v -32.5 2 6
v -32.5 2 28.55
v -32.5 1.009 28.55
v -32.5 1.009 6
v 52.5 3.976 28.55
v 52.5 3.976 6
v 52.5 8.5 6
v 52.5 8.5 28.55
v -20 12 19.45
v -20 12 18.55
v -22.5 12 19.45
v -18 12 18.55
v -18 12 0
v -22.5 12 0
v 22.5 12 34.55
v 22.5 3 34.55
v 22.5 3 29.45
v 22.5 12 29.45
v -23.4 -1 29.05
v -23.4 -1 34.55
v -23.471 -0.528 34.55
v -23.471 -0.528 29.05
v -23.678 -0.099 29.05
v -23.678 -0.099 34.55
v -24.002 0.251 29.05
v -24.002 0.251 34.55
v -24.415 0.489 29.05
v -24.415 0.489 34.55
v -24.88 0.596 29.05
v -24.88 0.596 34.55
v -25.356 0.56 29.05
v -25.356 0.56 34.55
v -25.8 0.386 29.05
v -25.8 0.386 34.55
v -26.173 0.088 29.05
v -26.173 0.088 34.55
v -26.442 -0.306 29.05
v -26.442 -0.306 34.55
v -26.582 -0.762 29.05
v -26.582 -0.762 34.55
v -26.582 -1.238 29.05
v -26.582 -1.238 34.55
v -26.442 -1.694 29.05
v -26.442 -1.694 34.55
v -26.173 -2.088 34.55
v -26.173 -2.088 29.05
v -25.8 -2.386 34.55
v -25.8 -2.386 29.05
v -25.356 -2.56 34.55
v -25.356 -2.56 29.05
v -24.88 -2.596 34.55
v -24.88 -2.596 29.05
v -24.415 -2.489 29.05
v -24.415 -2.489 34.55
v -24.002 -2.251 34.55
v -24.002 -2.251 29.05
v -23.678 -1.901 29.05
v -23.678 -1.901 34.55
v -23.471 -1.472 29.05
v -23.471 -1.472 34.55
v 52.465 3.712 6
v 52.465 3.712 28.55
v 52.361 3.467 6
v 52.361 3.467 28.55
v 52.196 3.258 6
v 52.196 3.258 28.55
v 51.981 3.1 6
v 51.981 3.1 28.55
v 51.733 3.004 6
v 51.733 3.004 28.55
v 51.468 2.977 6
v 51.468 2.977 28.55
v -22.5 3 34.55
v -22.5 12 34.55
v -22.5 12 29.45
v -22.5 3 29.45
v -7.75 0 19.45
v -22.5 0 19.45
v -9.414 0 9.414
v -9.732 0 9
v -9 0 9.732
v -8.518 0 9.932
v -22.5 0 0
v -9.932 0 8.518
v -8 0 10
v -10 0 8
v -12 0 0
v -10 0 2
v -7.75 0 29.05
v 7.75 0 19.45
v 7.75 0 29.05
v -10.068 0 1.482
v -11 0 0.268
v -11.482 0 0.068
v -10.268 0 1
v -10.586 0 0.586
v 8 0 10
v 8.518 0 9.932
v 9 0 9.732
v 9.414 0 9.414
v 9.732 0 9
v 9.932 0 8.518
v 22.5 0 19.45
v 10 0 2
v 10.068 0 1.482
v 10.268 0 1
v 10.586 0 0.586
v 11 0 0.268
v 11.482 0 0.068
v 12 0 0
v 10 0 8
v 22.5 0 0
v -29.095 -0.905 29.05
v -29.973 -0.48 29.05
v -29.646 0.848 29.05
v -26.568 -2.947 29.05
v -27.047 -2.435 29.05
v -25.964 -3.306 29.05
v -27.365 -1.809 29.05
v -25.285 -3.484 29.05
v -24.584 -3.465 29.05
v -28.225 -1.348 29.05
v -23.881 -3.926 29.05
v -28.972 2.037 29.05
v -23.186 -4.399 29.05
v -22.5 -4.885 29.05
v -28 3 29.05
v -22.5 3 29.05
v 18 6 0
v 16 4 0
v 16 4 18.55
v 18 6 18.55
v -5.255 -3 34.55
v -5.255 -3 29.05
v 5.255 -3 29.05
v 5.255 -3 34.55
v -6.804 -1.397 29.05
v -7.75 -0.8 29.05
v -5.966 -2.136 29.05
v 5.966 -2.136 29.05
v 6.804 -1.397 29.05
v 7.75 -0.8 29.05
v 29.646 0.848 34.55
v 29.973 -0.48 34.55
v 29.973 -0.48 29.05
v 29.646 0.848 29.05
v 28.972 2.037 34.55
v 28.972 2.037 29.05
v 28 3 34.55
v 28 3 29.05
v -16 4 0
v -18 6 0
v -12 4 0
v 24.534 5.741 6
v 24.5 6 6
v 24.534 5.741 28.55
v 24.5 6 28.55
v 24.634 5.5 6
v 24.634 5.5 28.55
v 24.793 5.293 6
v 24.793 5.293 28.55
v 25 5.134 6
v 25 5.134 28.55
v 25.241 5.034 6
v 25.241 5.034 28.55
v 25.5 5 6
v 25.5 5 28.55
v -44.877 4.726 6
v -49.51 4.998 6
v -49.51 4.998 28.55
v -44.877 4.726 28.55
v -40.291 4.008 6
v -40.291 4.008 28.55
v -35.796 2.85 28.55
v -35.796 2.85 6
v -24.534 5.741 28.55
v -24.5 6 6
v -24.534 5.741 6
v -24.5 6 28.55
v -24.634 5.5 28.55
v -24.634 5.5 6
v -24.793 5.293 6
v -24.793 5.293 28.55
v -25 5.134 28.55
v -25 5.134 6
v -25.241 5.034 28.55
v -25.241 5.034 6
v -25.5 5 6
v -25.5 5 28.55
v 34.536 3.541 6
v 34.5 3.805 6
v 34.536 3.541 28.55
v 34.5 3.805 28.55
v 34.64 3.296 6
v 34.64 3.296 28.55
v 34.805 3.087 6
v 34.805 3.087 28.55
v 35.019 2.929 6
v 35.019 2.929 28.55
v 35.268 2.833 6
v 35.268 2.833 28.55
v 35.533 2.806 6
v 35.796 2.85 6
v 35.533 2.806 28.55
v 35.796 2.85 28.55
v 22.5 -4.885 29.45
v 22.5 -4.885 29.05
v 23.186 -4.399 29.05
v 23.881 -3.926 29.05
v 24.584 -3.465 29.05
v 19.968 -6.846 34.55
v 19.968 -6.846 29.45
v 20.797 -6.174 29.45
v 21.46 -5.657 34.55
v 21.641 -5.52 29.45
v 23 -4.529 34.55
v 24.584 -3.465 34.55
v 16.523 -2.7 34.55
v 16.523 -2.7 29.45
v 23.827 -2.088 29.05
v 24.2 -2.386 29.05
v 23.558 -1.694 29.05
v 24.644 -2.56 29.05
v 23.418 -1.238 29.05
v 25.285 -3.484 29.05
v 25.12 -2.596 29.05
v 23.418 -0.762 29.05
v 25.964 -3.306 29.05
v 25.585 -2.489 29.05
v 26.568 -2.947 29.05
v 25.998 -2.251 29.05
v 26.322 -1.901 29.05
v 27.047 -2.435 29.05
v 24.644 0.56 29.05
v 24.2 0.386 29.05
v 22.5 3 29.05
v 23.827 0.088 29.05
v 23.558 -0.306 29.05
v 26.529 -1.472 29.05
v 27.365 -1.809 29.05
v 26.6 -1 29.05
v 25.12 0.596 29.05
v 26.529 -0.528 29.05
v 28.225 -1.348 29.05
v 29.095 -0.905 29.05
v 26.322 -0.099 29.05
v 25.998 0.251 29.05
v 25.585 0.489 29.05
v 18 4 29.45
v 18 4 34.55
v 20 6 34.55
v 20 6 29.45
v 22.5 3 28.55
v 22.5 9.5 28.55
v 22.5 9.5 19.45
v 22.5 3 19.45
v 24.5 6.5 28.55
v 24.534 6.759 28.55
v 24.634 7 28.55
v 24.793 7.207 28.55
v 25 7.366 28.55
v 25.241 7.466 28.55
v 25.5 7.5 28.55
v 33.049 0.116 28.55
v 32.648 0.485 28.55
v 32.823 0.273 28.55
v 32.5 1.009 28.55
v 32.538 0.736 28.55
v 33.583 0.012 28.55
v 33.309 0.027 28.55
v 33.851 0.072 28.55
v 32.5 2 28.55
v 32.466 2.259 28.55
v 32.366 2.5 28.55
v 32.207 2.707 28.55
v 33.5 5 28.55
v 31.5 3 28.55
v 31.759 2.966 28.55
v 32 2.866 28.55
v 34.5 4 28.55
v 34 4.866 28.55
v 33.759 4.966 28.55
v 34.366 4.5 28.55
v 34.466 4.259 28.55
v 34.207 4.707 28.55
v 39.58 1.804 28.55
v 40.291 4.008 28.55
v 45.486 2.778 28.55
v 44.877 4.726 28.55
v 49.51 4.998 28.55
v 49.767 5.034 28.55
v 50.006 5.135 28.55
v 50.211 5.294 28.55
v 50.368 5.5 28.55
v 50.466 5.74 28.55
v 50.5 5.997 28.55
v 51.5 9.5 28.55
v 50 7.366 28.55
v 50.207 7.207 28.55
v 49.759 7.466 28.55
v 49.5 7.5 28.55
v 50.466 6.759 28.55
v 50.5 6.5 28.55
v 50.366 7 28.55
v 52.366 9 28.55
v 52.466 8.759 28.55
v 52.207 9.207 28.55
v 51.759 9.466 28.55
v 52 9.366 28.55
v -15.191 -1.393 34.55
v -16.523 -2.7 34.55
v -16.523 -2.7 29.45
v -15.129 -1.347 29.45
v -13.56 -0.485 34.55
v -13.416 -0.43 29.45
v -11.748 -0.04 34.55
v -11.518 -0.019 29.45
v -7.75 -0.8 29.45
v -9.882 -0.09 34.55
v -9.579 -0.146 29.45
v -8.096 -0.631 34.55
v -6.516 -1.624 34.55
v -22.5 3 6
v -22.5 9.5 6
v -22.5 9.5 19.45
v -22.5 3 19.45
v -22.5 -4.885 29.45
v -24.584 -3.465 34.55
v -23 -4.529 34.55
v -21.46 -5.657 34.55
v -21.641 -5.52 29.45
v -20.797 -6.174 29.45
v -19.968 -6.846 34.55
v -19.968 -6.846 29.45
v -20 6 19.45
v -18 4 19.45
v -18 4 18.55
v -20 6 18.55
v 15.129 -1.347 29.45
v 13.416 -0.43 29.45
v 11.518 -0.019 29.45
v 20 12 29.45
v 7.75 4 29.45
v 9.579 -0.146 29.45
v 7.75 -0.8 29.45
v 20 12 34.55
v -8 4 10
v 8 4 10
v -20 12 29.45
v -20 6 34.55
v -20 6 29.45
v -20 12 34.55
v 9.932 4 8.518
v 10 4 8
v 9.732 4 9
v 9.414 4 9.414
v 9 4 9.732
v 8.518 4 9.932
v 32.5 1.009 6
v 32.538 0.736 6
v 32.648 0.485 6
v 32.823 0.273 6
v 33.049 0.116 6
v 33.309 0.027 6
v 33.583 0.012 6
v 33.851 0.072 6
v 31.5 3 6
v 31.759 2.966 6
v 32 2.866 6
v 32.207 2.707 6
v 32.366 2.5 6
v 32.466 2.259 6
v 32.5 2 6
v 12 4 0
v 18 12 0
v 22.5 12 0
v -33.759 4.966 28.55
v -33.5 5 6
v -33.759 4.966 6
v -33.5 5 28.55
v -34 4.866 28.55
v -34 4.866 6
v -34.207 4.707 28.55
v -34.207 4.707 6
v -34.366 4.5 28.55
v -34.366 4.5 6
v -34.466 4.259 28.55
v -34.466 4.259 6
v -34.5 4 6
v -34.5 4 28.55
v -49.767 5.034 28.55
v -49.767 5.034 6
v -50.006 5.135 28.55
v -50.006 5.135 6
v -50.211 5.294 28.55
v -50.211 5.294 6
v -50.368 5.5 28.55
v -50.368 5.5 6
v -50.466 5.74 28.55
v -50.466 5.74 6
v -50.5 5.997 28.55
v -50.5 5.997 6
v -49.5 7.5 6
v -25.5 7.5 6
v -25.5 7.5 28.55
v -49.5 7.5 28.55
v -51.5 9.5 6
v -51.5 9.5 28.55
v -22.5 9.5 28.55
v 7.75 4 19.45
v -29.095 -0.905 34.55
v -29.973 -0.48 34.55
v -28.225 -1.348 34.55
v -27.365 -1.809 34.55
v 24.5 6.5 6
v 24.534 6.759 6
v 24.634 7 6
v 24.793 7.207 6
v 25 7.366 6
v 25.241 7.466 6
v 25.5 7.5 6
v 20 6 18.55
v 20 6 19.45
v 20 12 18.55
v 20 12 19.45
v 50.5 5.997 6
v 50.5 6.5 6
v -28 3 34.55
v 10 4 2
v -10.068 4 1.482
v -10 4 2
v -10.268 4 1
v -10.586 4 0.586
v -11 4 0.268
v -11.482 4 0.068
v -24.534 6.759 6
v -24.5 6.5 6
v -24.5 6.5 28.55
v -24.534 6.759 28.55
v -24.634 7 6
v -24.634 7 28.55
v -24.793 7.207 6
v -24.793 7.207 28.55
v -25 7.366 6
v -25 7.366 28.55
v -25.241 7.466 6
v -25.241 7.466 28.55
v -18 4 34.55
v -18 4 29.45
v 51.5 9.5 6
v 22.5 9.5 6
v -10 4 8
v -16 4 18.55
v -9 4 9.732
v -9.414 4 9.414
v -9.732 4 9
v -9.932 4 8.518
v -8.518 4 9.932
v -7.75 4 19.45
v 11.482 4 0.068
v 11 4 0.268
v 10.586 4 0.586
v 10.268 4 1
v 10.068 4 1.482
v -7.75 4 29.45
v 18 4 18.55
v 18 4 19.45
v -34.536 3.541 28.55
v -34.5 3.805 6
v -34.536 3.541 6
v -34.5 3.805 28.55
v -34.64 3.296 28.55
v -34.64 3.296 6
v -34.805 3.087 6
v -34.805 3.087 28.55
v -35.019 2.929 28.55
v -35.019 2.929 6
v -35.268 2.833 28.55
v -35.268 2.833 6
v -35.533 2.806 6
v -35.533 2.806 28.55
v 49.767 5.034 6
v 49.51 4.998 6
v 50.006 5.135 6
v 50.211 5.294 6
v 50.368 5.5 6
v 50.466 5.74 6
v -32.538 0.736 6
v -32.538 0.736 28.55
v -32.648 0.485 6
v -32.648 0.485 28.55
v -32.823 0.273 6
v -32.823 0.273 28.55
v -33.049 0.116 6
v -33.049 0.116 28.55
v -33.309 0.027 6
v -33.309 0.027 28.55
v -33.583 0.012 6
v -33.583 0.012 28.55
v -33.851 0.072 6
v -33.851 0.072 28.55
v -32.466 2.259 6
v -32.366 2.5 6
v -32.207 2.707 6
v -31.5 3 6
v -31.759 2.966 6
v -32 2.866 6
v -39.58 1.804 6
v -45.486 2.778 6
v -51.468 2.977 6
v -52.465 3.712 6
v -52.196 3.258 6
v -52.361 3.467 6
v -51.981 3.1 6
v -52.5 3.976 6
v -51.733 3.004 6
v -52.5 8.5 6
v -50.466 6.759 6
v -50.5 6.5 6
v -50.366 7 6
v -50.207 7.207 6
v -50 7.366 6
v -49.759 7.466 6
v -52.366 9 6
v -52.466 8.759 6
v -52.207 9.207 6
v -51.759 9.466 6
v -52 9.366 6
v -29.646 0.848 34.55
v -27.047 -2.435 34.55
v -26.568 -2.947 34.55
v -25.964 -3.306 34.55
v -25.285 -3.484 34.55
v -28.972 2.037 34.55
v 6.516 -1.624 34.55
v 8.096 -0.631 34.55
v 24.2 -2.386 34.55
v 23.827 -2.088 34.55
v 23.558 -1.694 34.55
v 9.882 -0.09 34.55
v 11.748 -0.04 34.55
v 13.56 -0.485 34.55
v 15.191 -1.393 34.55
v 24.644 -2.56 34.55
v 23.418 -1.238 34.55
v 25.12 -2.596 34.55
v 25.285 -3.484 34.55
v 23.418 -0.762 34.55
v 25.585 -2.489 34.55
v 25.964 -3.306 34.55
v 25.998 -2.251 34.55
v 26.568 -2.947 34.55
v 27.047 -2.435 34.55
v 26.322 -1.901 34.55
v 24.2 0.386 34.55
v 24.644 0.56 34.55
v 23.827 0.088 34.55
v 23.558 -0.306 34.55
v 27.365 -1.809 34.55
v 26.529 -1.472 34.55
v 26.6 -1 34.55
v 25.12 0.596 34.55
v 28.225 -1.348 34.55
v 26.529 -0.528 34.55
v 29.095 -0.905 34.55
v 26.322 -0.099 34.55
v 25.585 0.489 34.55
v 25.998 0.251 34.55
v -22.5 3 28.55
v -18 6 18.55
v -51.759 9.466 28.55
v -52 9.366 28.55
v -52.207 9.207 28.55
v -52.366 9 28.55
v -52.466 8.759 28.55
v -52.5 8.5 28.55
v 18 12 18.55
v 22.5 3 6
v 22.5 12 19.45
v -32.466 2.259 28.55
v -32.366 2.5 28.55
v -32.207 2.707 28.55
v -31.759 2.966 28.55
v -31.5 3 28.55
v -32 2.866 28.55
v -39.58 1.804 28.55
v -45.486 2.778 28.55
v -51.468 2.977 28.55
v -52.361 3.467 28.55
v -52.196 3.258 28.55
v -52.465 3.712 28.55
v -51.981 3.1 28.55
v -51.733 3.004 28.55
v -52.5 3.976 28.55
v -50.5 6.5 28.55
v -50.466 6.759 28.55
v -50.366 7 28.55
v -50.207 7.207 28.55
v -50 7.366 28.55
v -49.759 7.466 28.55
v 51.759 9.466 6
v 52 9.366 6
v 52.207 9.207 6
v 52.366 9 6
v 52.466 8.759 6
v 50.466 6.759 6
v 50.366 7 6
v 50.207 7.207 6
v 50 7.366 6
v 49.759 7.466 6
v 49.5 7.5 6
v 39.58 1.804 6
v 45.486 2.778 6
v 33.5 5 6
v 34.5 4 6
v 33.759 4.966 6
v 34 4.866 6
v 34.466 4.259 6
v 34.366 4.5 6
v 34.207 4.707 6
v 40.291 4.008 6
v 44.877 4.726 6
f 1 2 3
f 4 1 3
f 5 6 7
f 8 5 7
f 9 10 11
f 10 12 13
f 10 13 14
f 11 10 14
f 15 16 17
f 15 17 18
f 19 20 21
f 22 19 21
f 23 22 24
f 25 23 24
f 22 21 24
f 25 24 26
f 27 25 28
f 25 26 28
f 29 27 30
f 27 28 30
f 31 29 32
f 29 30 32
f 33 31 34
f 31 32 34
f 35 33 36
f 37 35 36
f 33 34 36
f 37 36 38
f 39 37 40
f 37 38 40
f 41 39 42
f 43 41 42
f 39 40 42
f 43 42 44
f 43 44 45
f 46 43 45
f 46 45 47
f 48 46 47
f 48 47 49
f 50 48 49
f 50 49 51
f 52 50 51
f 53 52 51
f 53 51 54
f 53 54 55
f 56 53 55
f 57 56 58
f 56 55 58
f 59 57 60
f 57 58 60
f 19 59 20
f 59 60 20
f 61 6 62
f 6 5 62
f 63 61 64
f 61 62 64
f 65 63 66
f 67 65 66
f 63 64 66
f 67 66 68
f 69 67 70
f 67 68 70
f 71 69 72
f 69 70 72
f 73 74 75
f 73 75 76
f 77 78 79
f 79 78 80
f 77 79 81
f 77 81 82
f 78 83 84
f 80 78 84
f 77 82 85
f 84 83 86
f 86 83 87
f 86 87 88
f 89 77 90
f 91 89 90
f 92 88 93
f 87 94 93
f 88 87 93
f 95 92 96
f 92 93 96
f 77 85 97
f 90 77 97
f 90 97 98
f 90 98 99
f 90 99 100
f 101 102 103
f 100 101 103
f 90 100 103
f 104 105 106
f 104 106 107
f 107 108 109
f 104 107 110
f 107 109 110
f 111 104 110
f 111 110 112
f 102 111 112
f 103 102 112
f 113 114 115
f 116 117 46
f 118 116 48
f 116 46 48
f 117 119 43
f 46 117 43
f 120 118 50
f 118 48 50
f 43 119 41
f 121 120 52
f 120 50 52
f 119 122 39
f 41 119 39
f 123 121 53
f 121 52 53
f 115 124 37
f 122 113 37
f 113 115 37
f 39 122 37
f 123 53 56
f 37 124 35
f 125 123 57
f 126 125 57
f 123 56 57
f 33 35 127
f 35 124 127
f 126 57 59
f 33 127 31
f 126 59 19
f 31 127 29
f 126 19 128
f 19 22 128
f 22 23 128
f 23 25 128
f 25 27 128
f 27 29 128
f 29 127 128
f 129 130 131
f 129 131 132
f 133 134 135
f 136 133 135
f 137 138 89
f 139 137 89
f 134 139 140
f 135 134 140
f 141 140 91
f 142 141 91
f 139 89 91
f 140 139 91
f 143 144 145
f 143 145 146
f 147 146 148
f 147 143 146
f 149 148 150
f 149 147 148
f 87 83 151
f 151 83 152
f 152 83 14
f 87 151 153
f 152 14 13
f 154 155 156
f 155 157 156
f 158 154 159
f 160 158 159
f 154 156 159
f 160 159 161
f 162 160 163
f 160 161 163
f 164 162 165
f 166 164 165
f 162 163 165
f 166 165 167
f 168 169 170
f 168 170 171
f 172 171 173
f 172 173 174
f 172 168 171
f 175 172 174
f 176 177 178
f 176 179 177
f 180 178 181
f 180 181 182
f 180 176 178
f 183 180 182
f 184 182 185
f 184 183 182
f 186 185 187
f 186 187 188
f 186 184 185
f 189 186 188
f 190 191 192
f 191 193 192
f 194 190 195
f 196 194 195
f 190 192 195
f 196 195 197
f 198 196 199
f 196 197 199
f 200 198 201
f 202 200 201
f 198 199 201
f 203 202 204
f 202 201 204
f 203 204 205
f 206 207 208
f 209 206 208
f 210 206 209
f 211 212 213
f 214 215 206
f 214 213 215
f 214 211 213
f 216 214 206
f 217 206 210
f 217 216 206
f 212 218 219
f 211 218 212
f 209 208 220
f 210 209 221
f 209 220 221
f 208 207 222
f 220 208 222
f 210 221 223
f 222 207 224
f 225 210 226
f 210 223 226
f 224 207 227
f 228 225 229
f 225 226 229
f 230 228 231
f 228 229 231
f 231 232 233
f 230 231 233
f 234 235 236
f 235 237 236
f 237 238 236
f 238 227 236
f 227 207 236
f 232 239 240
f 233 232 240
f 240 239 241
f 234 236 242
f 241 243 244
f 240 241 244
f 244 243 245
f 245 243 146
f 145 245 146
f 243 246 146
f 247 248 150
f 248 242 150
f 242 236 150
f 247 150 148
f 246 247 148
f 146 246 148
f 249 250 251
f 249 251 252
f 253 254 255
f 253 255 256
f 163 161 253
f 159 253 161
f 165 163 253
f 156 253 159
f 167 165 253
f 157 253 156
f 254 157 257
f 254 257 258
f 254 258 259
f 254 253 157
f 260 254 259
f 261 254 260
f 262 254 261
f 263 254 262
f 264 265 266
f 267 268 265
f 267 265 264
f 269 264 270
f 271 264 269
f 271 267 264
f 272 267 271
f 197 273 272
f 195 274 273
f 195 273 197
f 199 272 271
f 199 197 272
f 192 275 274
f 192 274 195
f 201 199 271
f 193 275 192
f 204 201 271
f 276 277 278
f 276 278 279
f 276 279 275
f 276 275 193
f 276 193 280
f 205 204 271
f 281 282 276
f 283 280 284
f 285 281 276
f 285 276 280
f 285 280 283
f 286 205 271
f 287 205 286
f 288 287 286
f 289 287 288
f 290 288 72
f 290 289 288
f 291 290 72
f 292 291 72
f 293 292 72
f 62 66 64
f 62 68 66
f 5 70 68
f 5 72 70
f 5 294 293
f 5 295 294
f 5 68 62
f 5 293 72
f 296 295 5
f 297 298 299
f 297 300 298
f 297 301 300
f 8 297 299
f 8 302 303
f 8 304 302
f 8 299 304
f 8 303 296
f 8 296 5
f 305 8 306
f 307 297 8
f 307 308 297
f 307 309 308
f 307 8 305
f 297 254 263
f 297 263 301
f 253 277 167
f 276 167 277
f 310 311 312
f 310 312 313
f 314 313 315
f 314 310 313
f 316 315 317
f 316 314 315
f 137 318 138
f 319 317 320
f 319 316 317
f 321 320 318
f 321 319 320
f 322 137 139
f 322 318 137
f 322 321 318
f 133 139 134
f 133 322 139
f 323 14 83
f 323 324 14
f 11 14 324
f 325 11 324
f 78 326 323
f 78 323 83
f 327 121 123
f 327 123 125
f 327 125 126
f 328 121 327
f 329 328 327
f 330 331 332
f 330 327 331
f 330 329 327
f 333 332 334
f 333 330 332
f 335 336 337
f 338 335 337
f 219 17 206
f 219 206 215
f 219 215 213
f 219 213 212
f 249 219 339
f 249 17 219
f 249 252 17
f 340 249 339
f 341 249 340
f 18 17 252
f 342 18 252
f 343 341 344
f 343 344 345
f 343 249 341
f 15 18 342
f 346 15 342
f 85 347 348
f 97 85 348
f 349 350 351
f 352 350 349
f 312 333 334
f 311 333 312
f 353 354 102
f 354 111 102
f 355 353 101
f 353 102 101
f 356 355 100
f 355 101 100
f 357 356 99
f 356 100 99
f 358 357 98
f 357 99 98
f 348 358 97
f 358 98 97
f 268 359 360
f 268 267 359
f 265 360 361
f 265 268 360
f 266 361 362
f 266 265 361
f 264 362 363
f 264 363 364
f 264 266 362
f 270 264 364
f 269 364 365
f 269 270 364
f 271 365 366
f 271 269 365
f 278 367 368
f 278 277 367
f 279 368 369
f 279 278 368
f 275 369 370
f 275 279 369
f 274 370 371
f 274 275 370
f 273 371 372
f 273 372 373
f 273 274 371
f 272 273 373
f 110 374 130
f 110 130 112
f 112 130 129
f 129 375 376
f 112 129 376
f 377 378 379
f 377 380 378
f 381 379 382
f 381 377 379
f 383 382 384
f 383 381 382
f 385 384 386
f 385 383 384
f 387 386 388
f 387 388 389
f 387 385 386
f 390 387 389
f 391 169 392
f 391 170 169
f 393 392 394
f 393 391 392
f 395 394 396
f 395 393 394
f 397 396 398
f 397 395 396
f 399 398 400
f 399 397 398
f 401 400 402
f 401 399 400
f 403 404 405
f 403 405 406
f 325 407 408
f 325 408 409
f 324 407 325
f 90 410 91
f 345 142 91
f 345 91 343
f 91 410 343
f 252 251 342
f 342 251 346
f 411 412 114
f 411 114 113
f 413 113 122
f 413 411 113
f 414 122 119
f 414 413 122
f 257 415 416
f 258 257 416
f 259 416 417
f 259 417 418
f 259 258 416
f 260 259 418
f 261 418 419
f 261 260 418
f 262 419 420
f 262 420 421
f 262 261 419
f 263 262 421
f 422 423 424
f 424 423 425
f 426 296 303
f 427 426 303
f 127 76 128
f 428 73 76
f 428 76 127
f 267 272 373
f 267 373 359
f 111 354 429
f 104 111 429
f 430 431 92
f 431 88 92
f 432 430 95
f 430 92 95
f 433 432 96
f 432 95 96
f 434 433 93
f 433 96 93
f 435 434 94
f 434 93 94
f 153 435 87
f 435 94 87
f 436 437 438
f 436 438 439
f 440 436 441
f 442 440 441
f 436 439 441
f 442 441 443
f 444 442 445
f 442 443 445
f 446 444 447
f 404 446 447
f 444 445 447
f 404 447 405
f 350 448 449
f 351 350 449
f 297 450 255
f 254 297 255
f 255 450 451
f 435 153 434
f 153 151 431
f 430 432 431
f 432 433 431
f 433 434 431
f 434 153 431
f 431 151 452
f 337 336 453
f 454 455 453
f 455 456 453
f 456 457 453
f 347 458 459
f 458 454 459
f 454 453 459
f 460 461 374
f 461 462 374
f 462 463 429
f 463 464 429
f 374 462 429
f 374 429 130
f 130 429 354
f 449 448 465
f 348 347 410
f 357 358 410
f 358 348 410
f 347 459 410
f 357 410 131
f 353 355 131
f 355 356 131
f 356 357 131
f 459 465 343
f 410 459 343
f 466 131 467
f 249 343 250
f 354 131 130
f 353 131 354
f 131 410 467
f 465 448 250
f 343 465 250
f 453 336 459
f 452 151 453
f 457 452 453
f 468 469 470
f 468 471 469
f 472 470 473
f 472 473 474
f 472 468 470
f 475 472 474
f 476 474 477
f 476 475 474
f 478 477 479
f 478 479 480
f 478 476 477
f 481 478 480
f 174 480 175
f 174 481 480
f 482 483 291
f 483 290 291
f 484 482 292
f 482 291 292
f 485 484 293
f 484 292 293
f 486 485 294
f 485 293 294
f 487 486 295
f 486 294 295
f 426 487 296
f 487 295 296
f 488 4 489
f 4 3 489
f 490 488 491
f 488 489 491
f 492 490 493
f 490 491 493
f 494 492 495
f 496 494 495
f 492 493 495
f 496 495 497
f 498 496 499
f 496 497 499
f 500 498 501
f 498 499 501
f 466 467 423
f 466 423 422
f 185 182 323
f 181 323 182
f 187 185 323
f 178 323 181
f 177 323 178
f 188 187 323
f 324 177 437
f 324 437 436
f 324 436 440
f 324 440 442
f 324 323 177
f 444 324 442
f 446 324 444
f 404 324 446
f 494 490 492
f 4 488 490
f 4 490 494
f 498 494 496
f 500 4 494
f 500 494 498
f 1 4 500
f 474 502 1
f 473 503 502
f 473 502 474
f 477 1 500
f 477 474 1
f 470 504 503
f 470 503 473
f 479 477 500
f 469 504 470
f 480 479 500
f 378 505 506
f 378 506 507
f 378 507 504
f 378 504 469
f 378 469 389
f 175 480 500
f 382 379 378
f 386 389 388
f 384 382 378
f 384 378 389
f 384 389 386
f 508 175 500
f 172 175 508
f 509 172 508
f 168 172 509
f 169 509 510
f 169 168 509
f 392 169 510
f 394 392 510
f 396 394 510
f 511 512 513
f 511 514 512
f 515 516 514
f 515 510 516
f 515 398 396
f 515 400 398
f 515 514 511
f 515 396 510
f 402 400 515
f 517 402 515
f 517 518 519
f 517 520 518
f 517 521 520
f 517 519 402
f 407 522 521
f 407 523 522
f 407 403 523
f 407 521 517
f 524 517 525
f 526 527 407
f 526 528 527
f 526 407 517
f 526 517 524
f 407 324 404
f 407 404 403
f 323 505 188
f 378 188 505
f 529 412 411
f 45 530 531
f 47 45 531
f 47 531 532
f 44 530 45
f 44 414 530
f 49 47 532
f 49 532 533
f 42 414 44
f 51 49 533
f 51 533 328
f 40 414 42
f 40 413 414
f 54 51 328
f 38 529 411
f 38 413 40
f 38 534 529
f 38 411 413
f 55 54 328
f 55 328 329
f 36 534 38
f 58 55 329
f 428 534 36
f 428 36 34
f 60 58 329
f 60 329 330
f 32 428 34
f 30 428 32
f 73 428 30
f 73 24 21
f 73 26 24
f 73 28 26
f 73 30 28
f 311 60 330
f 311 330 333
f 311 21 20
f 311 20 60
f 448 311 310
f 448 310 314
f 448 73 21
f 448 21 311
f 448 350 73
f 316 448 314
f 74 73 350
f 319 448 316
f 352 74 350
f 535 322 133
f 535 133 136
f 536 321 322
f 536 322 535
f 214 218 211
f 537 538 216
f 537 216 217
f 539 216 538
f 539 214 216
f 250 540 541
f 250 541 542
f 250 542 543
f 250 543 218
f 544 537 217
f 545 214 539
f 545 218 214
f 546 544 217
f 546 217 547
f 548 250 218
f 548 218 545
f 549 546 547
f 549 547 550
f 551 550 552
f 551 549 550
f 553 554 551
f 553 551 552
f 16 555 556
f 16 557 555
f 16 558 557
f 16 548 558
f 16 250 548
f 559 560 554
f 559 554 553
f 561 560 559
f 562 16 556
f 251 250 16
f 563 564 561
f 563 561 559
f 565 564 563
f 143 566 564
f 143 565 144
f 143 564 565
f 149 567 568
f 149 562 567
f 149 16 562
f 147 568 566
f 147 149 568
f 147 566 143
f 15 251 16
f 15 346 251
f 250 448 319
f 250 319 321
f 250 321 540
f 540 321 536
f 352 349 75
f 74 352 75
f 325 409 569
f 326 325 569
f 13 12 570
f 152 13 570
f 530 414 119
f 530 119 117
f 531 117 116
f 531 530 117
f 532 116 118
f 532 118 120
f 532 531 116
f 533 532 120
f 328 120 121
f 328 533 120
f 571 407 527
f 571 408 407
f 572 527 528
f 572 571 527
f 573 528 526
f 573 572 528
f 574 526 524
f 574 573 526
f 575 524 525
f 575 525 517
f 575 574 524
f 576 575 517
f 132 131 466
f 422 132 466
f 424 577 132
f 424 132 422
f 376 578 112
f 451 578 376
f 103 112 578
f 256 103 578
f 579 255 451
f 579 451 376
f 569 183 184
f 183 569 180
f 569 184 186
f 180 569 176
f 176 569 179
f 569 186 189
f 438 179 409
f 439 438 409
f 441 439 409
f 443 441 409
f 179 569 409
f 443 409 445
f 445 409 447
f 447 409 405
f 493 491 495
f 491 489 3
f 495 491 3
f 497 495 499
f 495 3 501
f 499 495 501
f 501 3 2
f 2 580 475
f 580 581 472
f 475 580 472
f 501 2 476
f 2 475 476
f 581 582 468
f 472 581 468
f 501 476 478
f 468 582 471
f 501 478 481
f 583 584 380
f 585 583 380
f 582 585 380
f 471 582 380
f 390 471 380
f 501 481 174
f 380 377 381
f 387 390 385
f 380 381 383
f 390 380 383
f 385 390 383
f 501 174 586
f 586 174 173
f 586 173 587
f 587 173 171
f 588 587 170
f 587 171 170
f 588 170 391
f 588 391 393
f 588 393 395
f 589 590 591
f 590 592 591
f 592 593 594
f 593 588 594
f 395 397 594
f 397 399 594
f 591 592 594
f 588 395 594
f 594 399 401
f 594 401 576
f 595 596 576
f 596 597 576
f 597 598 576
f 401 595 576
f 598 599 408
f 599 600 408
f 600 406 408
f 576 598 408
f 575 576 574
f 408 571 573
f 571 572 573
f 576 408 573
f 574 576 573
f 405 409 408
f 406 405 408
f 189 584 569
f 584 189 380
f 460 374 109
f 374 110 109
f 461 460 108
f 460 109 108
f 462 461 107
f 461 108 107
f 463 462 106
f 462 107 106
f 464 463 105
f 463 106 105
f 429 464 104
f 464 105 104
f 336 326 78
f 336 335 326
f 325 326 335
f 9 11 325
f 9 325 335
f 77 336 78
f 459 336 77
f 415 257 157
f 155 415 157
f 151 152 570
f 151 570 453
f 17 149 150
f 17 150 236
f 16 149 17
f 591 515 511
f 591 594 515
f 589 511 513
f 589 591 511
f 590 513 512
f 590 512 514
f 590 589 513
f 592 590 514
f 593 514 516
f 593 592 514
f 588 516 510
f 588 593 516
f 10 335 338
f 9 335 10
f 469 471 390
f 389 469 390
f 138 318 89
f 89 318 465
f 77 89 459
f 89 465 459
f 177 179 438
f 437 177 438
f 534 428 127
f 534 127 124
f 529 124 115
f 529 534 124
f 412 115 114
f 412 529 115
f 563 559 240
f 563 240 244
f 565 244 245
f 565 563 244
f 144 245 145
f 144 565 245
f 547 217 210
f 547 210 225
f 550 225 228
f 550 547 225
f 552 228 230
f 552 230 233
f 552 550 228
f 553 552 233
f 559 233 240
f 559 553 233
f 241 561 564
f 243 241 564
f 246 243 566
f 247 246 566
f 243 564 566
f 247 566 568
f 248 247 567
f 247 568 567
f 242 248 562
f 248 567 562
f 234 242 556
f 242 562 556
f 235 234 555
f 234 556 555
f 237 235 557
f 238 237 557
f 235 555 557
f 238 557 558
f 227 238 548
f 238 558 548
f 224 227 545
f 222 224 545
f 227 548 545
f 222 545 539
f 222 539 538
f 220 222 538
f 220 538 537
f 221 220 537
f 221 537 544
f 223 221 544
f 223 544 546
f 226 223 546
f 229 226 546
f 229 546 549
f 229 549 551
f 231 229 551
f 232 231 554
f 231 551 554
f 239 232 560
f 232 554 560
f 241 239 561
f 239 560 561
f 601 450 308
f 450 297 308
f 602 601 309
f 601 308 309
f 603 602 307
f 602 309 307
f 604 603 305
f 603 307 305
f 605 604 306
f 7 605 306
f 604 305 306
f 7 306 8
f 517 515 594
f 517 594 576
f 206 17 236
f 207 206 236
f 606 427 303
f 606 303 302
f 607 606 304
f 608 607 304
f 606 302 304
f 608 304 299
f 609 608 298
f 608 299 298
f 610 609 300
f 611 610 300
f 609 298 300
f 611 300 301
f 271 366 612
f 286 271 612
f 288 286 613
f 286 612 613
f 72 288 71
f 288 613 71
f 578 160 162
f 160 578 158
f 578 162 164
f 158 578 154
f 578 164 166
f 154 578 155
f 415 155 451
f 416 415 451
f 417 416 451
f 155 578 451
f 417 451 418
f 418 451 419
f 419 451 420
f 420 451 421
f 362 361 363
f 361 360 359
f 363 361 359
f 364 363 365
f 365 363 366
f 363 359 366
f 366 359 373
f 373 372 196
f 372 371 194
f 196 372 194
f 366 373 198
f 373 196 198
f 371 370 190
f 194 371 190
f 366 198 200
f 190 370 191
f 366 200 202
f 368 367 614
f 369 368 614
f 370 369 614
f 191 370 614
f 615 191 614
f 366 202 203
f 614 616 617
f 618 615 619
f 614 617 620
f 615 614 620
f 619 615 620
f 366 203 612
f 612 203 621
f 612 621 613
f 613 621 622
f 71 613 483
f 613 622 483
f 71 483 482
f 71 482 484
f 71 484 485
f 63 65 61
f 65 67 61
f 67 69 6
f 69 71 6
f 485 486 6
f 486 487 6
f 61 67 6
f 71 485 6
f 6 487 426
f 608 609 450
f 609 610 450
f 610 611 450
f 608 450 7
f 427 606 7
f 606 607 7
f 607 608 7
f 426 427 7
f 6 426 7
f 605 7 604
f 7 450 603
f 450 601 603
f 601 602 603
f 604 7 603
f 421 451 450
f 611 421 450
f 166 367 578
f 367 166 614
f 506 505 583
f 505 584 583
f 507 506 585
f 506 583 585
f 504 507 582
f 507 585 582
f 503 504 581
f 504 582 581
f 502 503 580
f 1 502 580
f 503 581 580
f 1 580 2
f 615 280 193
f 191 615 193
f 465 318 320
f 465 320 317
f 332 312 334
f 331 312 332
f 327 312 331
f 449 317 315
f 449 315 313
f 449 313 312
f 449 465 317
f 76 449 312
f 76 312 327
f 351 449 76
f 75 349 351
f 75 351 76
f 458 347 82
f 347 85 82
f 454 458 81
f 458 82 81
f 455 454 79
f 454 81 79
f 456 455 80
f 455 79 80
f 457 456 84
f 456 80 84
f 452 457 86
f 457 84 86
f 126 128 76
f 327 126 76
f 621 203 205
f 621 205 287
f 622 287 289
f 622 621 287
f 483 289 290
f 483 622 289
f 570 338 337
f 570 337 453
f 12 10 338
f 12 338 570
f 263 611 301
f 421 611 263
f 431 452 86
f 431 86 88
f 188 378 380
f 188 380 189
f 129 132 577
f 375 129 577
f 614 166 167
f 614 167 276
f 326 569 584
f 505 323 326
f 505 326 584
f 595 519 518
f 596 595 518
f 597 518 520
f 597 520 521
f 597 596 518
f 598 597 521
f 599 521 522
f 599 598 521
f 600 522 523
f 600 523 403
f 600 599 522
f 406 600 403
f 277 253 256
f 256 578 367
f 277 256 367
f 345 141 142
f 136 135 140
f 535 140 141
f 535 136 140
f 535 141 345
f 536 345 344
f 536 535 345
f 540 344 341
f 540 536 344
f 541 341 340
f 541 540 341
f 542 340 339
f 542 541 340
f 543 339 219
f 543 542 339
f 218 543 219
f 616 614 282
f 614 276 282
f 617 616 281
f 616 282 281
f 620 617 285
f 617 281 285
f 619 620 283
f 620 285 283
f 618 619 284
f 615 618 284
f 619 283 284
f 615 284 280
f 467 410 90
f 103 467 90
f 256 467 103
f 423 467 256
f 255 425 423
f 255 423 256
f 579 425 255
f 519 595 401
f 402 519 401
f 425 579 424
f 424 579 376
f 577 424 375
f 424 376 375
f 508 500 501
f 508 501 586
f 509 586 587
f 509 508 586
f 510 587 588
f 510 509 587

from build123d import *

# Parameters (mm, degrees)
EXTRUDE_1_DEPTH          = 34.55
SKETCH_2_W               = 40
SKETCH_2_H               = 8
CUT_EXTRUDE_1_DEPTH      = 16
CHAMFER_1_SIZE           = 2
SKETCH_6_R               = 1.6
EXTRUDE_2_DEPTH          = 6.9
SKETCH_8_R               = 1.6
EXTRUDE_3_DEPTH          = 5.5
CUT_EXTRUDE_6_DEPTH      = 10
CUT_EXTRUDE_7_DEPTH      = 25
CUT_EXTRUDE_8_DEPTH      = 25
CUT_EXTRUDE_8_DEPTH_BACK = 25
SKETCH_14_W              = 20
SKETCH_14_H              = 10
CUT_EXTRUDE_9_DEPTH      = 25
FILLET_1_R               = 2
EXTRUDE_START            = -6
EXTRUDE_4_DEPTH          = 22.55
FILLET_2_R               = 1


with BuildPart() as part:
    # 草图1 → 凸台-拉伸1 (new body)
    with BuildSketch(Plane.XY):
        Polygon((0, 0), (22.5, 0), (22.5, 12), (-22.5, 12), (-22.5, 0), align=None)
    extrude(amount=EXTRUDE_1_DEPTH)

    # 草图2 → 切除-拉伸1 (cut)
    with BuildSketch(Plane.XY.offset(34.55)):
        with Locations((0, 8)):
            Rectangle(SKETCH_2_W, SKETCH_2_H)
    extrude(amount=-CUT_EXTRUDE_1_DEPTH, mode=Mode.SUBTRACT)

    # 倒角1
    chamfer_1_edges = [part.edges().sort_by_distance(p)[0] for p in [
        (20, 4, 26.55),
        (-20, 4, 26.55),
    ]]
    chamfer(chamfer_1_edges, length=CHAMFER_1_SIZE)

    # 草图6 → 凸台-拉伸2 (add)
    with BuildSketch(Plane(origin=(0, 12, 0), x_dir=(1, 0, 0), z_dir=(0, 1, 0))):
        with BuildLine():
            Line((22.5, 0), (22.5, -13.5))
            Line((22.5, -13.5), (17, -13.5))
            ThreePointArc((17, -13.5), (15.232233047, -12.767766953), (14.5, -11))
            Line((14.5, -11), (14.5, -5))
            Line((14.5, -5), (14.5, 0))
            Line((14.5, 0), (22.5, 0))
        make_face()
        with Locations((17, -5)):
            Circle(SKETCH_6_R, mode=Mode.SUBTRACT)
        with Locations((17, -11)):
            Circle(SKETCH_6_R, mode=Mode.SUBTRACT)
        with BuildLine():
            Line((-14.5, 0), (-22.5, 0))
            Line((-22.5, 0), (-22.5, -13.5))
            Line((-22.5, -13.5), (-17, -13.5))
            ThreePointArc((-17, -13.5), (-15.232233047, -12.767766953), (-14.5, -11))
            Line((-14.5, -11), (-14.5, -5))
            Line((-14.5, -5), (-14.5, 0))
        make_face()
        with Locations((-17, -11)):
            Circle(SKETCH_6_R, mode=Mode.SUBTRACT)
        with Locations((-17, -5)):
            Circle(SKETCH_6_R, mode=Mode.SUBTRACT)
    extrude(amount=-EXTRUDE_2_DEPTH)

    # 草图8 → 凸台-拉伸3 (add)
    with BuildSketch(Plane.XY.offset(34.55)):
        with BuildLine():
            Line((1.843049286, -25.367101461), (9.230566594, -19.615105309))
            ThreePointArc((9.230566594, -19.615105309), (9.814108465, -18.625953935), (10.421644381, -17.651355727))
            Line((10.421644381, -17.651355727), (5.476763257, -11.300448334))
            ThreePointArc((5.476763257, -11.300448334), (6.699551666, -1.476763257), (16.523236743, -2.699551666))
            Line((16.523236743, -2.699551666), (19.967990067, -6.846461039))
            ThreePointArc((19.967990067, -6.846461039), (22.224318463, -5.085470923), (24.58365332, -3.465087309))
            ThreePointArc((24.58365332, -3.465087309), (26.278709649, -3.148232211), (27.365383934, -1.809295278))
            ThreePointArc((27.365383934, -1.809295278), (28.658809968, -1.124546474), (29.972928279, -0.480399834))
            ThreePointArc((29.972928279, -0.480399834), (29.349734714, 1.46572665), (28, 3))
            Line((28, 3), (22.5, 3))
            Line((22.5, 3), (22.5, 4))
            Line((22.5, 4), (-22.5, 4))
            Line((-22.5, 4), (-22.5, 3))
            Line((-22.5, 3), (-28, 3))
            ThreePointArc((-28, 3), (-29.349734714, 1.46572665), (-29.972928279, -0.480399834))
            ThreePointArc((-29.972928279, -0.480399834), (-28.658809968, -1.124546474), (-27.365383934, -1.809295278))
            ThreePointArc((-27.365383934, -1.809295278), (-26.278709649, -3.148232211), (-24.58365332, -3.465087309))
            ThreePointArc((-24.58365332, -3.465087309), (-22.224318463, -5.085470923), (-19.967990067, -6.846461039))
            Line((-19.967990067, -6.846461039), (-16.523236743, -2.699551666))
            ThreePointArc((-16.523236743, -2.699551666), (-6.699551666, -1.476763257), (-5.476763257, -11.300448334))
            Line((-5.476763257, -11.300448334), (-10.421644381, -17.651355727))
            ThreePointArc((-10.421644381, -17.651355727), (-9.814108465, -18.625953935), (-9.230566594, -19.615105309))
            Line((-9.230566594, -19.615105309), (-1.843049286, -25.367101461))
            ThreePointArc((-1.843049286, -25.367101461), (0, -26), (1.843049286, -25.367101461))
        make_face()
        with Locations((25, -1)):
            Circle(SKETCH_8_R, mode=Mode.SUBTRACT)
        with Locations((0, -23)):
            Circle(SKETCH_8_R, mode=Mode.SUBTRACT)
        with Locations((-25, -1)):
            Circle(SKETCH_8_R, mode=Mode.SUBTRACT)
    extrude(amount=-EXTRUDE_3_DEPTH)

    # 草图11 → 切除-拉伸6 (cut)
    with BuildSketch(Plane(origin=(0, 0, 29.05), x_dir=(-1, 0, 0), z_dir=(0, 0, -1))):
        Polygon((-4, -7), (-10.421644381, -17.651355727), (-10.421644381, -27.0891889), (10.421644381, -27.0891889), (10.421644381, -17.651355727), (4, -7), (5.255437353, -3), (0, -3), (-5.255437353, -3), align=None)
    extrude(amount=-CUT_EXTRUDE_6_DEPTH, mode=Mode.SUBTRACT)

    # 草图12 → 切除-拉伸7 (cut)
    with BuildSketch(Plane.XY.offset(18.55)):
        Polygon((-18, 6), (-16, 4), (16, 4), (18, 6), (18, 12), (-18, 12), align=None)
    extrude(amount=-CUT_EXTRUDE_7_DEPTH, mode=Mode.SUBTRACT)

    # 草图13 → 切除-拉伸8 (cut, two sides)
    with BuildSketch(Plane(origin=(0, 4, 0), x_dir=(1, 0, 0), z_dir=(0, 1, 0))) as cut_extrude_8_sk:
        Polygon((-7.75, -24.45), (-7.75, -28.45), (-7.75, -29.45), (-22.5, -29.45), (-22.5, -28.45), (-22.5, -24.45), (-22.5, -21.45), (-22.5, -19.45), (-7.75, -19.45), align=None)
        Polygon((22.5, -19.45), (22.5, -21.45), (22.5, -24.45), (22.5, -28.45), (22.5, -29.45), (7.75, -29.45), (7.75, -28.45), (7.75, -24.45), (7.75, -19.45), align=None)
    extrude(amount=CUT_EXTRUDE_8_DEPTH, mode=Mode.SUBTRACT)
    extrude(cut_extrude_8_sk.sketch, amount=-CUT_EXTRUDE_8_DEPTH_BACK, mode=Mode.SUBTRACT)

    # 草图14 → 切除-拉伸9 (cut)
    with BuildSketch(Plane(origin=(0, 4, 0), x_dir=(1, 0, 0), z_dir=(0, 1, 0))):
        with Locations((0, -5)):
            Rectangle(SKETCH_14_W, SKETCH_14_H)
    extrude(amount=-CUT_EXTRUDE_9_DEPTH, mode=Mode.SUBTRACT)

    # 圆角1
    fillet_1_edges = [part.edges().sort_by_distance(p)[0] for p in [
        (10, 2, 0),
        (-10, 2, 0),
        (10, 2, 10),
        (-10, 2, 10),
    ]]
    fillet(fillet_1_edges, radius=FILLET_1_R)

    # 草图15 → 凸台-拉伸4 (add)
    with BuildSketch(Plane(origin=(0, 0, 0), x_dir=(-1, 0, 0), z_dir=(0, 0, -1)).offset(EXTRUDE_START)):
        with BuildLine():
            Line((-22.5, 9.5), (-22.5, 3))
            Line((-22.5, 3), (-32.5, 3))
            Line((-32.5, 3), (-32.5, -0.458843457))
            ThreePointArc((-32.5, -0.458843457), (-42.310755549, 2.352789548), (-52.5, 2.932014979))
            Line((-52.5, 2.932014979), (-52.5, 9.5))
            Line((-52.5, 9.5), (-22.5, 9.5))
        make_face()
        with BuildLine():
            Line((-24.5, 7.5), (-24.5, 5))
            Line((-24.5, 5), (-34.5, 5))
            Line((-34.5, 5), (-34.5, 2.428515274))
            ThreePointArc((-34.5, 2.428515274), (-42.390809061, 4.393039713), (-50.5, 4.997395763))
            Line((-50.5, 4.997395763), (-50.5, 7.5))
            Line((-50.5, 7.5), (-24.5, 7.5))
        make_face(mode=Mode.SUBTRACT)
        with BuildLine():
            Line((32.5, 3), (32.5, -0.458843457))
            ThreePointArc((32.5, -0.458843457), (42.310755549, 2.352789548), (52.5, 2.932014979))
            Line((52.5, 2.932014979), (52.5, 9.5))
            Line((52.5, 9.5), (22.5, 9.5))
            Line((22.5, 9.5), (22.5, 3))
            Line((22.5, 3), (32.5, 3))
        make_face()
        with BuildLine():
            Line((24.5, 7.5), (50.5, 7.5))
            Line((50.5, 7.5), (50.5, 4.997395763))
            ThreePointArc((50.5, 4.997395763), (42.390809061, 4.393039713), (34.5, 2.428515274))
            Line((34.5, 2.428515274), (34.5, 5))
            Line((34.5, 5), (24.5, 5))
            Line((24.5, 5), (24.5, 7.5))
        make_face(mode=Mode.SUBTRACT)
    extrude(amount=-EXTRUDE_4_DEPTH)

    # 圆角2
    fillet_2_edges = [part.edges().sort_by_distance(p)[0] for p in [
        (52.5, 9.5, 17.275),
        (32.5, 3, 17.275),
        (32.5, -0.458843457, 17.275),
        (52.5, 2.932014979, 17.275),
        (24.5, 7.5, 17.275),
        (24.5, 5, 17.275),
        (34.5, 5, 17.275),
        (34.5, 2.428515274, 17.275),
        (50.5, 4.997395763, 17.275),
        (50.5, 7.5, 17.275),
        (-52.5, 9.5, 17.275),
        (-52.5, 2.932014979, 17.275),
        (-32.5, -0.458843457, 17.275),
        (-32.5, 3, 17.275),
        (-24.5, 7.5, 17.275),
        (-50.5, 7.5, 17.275),
        (-50.5, 4.997395763, 17.275),
        (-34.5, 2.428515274, 17.275),
        (-34.5, 5, 17.275),
        (-24.5, 5, 17.275),
    ]]
    fillet(fillet_2_edges, radius=FILLET_2_R)


solid = part.part
